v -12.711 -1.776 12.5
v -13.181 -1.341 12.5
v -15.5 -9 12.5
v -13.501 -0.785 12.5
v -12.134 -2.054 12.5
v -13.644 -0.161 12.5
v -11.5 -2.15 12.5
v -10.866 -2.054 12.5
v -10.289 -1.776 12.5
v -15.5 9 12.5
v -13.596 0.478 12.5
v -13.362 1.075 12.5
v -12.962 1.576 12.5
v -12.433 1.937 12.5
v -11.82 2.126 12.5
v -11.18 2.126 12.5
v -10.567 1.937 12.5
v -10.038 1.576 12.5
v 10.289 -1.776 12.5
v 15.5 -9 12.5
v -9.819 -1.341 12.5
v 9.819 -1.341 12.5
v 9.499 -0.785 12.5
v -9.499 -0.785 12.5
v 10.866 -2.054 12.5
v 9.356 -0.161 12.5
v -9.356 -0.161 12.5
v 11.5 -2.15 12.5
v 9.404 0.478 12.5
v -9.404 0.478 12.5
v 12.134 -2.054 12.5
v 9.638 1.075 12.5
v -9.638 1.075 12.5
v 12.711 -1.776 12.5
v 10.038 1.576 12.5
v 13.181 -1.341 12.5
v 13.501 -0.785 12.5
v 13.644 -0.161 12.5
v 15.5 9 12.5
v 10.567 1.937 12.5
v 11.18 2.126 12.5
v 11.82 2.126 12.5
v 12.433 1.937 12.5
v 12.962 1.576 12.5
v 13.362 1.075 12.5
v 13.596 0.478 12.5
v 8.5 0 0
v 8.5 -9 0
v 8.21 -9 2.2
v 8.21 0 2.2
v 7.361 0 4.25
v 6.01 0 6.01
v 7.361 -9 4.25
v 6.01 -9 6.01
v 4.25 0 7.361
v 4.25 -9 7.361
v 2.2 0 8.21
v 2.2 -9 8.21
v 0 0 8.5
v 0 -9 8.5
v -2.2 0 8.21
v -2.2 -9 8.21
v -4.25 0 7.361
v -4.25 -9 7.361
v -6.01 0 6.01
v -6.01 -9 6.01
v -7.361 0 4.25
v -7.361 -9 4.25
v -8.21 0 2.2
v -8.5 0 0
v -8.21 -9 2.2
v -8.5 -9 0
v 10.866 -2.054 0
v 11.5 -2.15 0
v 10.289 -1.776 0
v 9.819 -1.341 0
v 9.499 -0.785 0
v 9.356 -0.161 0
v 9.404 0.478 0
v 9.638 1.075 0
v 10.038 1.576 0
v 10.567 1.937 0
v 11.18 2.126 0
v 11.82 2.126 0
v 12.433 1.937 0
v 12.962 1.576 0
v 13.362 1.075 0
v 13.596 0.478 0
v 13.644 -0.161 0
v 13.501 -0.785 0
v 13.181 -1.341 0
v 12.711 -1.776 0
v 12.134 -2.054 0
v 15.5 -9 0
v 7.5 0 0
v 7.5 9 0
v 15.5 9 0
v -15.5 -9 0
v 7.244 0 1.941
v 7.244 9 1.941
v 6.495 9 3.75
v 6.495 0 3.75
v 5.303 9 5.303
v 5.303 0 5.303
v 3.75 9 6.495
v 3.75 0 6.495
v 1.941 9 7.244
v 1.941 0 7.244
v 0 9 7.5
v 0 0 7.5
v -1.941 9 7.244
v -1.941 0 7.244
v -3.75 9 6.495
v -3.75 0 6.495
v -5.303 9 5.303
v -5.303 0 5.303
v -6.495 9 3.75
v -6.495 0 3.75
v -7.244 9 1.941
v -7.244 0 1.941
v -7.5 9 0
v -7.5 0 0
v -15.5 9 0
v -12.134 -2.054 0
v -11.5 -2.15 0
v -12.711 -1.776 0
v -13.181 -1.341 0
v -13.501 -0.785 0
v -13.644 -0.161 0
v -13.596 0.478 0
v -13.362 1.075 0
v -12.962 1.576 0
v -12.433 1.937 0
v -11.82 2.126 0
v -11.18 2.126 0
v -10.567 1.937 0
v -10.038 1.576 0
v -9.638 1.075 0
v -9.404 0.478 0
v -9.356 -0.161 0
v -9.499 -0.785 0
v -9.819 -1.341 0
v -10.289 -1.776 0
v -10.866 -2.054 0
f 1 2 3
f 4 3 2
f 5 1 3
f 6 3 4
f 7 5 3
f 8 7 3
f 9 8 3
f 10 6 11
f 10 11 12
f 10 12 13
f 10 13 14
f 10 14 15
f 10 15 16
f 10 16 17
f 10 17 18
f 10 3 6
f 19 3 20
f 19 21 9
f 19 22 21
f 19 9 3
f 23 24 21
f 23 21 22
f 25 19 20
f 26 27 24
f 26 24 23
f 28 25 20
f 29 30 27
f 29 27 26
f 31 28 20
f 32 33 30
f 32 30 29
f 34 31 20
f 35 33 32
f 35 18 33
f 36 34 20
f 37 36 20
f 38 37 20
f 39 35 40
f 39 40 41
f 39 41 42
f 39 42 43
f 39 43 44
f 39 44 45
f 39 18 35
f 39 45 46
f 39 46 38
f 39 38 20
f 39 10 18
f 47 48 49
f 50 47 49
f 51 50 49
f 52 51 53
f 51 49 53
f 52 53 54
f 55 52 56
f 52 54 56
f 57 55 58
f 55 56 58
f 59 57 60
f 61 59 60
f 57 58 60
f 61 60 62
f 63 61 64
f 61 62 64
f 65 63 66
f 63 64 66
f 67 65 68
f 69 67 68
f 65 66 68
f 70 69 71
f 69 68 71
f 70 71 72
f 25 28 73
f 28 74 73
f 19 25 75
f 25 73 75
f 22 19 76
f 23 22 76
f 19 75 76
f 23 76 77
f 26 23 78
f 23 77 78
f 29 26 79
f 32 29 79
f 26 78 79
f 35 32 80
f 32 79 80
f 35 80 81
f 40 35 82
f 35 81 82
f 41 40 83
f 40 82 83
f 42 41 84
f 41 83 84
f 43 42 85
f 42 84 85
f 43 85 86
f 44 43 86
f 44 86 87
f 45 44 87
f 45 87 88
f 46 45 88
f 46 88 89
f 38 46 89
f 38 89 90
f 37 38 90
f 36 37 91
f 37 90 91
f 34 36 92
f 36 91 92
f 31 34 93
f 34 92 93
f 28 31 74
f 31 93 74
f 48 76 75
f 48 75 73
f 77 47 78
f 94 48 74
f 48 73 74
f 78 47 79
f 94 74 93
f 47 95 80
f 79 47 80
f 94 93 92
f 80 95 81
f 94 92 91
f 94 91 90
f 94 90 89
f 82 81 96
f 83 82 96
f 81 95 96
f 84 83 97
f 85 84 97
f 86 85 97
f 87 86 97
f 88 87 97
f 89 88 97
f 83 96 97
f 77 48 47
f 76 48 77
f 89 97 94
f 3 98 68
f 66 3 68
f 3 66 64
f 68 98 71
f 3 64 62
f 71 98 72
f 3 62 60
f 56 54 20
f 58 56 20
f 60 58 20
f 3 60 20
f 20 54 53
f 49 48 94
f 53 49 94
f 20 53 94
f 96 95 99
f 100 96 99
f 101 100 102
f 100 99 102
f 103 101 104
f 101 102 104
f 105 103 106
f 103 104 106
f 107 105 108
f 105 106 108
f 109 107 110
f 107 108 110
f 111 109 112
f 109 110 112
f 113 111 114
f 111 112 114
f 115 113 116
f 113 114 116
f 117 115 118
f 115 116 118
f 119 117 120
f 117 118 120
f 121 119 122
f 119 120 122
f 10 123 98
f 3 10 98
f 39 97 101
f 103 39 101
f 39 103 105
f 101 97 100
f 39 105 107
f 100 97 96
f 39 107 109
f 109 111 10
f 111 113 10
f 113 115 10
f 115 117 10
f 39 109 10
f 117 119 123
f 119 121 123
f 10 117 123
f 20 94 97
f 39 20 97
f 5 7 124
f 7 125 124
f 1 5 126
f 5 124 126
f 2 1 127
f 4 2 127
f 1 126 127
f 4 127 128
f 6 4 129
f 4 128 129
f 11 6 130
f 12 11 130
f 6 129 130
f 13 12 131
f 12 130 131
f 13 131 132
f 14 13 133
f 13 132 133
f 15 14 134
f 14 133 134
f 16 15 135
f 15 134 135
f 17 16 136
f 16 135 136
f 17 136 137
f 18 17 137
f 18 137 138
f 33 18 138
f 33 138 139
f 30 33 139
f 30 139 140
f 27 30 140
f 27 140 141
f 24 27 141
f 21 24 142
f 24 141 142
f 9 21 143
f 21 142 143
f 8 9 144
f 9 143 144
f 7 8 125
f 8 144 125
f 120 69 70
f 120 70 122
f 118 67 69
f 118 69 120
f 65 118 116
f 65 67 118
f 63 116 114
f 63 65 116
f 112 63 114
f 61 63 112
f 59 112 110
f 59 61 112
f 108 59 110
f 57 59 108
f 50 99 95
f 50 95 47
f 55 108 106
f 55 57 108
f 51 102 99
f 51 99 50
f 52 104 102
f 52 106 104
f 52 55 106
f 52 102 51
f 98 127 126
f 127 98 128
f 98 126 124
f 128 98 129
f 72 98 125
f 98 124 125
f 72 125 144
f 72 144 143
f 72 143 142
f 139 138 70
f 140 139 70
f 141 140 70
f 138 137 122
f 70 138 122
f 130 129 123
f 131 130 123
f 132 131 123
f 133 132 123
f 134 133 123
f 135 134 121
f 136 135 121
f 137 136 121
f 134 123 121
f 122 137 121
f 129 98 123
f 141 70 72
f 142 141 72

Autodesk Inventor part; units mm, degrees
ref_plane "YZ Plane" through (0, 0, 0) normal (1, 0, 0) x (0, 1, 0)
ref_plane "XZ Plane" through (0, 0, 0) normal (0, 1, 0) x (-1, 0, 0)
ref_plane "XY Plane" through (0, 0, 0) normal (0, 0, 1) x (1, 0, 0)
sketch "Sketch1" plane through (0, 0, 0) normal (0, 0, 1) x (1, 0, 0)
  line L0 (-15.5, -9) -> (15.5, -9)
  line L1 (15.5, -9) -> (15.5, 9)
  line L2 (15.5, 9) -> (-15.5, 9)
  line L3 (-15.5, 9) -> (-15.5, -9)
  line L4 (-15.5, -9) -> (15.5, 9) construction
  line L5 (15.5, -9) -> (-15.5, 9) construction
  point P0 (0, 0)
  dimension "d0" = 31
  dimension "d1" = 18
extrude "Extrusion1" add sketch "Sketch1" along normal blind 12.5
sketch "Sketch8" plane through (-15.5, -9, 0) normal (0, -1, 0) x (1, 0, 0)
  circle A0 centre (15.5, 0) radius 7.5
  dimension "d57" = 15
extrude "Extrusion8" cut sketch "Sketch8" against normal through all
sketch "Sketch9" plane through (0, 0, 12.5) normal (0, 0, 1) x (1, 0, 0)
  line L0 (-15.5, -9) -> (15.5, -9) projected
  point P0 (0, 0)
  point P1 (-11.5, 0)
  point P2 (11.5, 0)
  dimension "d68" = 11.5
  dimension "d69" = 11.5
  dimension "d70" = 9
  dimension "d71" = 9
hole "Hole1" at (-11.5, 0, 12.5) at (11.5, 0, 12.5) direction (0, 0, -1) diameter 4.3 end through all clearance for "Flat Head Machine Screw" size "M4" standard "Ansi Metric M Profile"
sketch "Sketch10" plane through (-15.5, -9, 12.5) normal (0, -1, 0) x (1, 0, 0)
  arc A0 (23, -12.5) -> (8, -12.5) centre (15.5, -12.5) ccw projected
  circle A1 centre (15.5, -12.5) radius 8.5
  dimension "d79" = 17
extrude "Extrusion10" cut sketch "Sketch10" against normal blind 9
equation "\"d69\" = d68"
equation "\"d71\" = d70"
properties part number "Colimador superior"
